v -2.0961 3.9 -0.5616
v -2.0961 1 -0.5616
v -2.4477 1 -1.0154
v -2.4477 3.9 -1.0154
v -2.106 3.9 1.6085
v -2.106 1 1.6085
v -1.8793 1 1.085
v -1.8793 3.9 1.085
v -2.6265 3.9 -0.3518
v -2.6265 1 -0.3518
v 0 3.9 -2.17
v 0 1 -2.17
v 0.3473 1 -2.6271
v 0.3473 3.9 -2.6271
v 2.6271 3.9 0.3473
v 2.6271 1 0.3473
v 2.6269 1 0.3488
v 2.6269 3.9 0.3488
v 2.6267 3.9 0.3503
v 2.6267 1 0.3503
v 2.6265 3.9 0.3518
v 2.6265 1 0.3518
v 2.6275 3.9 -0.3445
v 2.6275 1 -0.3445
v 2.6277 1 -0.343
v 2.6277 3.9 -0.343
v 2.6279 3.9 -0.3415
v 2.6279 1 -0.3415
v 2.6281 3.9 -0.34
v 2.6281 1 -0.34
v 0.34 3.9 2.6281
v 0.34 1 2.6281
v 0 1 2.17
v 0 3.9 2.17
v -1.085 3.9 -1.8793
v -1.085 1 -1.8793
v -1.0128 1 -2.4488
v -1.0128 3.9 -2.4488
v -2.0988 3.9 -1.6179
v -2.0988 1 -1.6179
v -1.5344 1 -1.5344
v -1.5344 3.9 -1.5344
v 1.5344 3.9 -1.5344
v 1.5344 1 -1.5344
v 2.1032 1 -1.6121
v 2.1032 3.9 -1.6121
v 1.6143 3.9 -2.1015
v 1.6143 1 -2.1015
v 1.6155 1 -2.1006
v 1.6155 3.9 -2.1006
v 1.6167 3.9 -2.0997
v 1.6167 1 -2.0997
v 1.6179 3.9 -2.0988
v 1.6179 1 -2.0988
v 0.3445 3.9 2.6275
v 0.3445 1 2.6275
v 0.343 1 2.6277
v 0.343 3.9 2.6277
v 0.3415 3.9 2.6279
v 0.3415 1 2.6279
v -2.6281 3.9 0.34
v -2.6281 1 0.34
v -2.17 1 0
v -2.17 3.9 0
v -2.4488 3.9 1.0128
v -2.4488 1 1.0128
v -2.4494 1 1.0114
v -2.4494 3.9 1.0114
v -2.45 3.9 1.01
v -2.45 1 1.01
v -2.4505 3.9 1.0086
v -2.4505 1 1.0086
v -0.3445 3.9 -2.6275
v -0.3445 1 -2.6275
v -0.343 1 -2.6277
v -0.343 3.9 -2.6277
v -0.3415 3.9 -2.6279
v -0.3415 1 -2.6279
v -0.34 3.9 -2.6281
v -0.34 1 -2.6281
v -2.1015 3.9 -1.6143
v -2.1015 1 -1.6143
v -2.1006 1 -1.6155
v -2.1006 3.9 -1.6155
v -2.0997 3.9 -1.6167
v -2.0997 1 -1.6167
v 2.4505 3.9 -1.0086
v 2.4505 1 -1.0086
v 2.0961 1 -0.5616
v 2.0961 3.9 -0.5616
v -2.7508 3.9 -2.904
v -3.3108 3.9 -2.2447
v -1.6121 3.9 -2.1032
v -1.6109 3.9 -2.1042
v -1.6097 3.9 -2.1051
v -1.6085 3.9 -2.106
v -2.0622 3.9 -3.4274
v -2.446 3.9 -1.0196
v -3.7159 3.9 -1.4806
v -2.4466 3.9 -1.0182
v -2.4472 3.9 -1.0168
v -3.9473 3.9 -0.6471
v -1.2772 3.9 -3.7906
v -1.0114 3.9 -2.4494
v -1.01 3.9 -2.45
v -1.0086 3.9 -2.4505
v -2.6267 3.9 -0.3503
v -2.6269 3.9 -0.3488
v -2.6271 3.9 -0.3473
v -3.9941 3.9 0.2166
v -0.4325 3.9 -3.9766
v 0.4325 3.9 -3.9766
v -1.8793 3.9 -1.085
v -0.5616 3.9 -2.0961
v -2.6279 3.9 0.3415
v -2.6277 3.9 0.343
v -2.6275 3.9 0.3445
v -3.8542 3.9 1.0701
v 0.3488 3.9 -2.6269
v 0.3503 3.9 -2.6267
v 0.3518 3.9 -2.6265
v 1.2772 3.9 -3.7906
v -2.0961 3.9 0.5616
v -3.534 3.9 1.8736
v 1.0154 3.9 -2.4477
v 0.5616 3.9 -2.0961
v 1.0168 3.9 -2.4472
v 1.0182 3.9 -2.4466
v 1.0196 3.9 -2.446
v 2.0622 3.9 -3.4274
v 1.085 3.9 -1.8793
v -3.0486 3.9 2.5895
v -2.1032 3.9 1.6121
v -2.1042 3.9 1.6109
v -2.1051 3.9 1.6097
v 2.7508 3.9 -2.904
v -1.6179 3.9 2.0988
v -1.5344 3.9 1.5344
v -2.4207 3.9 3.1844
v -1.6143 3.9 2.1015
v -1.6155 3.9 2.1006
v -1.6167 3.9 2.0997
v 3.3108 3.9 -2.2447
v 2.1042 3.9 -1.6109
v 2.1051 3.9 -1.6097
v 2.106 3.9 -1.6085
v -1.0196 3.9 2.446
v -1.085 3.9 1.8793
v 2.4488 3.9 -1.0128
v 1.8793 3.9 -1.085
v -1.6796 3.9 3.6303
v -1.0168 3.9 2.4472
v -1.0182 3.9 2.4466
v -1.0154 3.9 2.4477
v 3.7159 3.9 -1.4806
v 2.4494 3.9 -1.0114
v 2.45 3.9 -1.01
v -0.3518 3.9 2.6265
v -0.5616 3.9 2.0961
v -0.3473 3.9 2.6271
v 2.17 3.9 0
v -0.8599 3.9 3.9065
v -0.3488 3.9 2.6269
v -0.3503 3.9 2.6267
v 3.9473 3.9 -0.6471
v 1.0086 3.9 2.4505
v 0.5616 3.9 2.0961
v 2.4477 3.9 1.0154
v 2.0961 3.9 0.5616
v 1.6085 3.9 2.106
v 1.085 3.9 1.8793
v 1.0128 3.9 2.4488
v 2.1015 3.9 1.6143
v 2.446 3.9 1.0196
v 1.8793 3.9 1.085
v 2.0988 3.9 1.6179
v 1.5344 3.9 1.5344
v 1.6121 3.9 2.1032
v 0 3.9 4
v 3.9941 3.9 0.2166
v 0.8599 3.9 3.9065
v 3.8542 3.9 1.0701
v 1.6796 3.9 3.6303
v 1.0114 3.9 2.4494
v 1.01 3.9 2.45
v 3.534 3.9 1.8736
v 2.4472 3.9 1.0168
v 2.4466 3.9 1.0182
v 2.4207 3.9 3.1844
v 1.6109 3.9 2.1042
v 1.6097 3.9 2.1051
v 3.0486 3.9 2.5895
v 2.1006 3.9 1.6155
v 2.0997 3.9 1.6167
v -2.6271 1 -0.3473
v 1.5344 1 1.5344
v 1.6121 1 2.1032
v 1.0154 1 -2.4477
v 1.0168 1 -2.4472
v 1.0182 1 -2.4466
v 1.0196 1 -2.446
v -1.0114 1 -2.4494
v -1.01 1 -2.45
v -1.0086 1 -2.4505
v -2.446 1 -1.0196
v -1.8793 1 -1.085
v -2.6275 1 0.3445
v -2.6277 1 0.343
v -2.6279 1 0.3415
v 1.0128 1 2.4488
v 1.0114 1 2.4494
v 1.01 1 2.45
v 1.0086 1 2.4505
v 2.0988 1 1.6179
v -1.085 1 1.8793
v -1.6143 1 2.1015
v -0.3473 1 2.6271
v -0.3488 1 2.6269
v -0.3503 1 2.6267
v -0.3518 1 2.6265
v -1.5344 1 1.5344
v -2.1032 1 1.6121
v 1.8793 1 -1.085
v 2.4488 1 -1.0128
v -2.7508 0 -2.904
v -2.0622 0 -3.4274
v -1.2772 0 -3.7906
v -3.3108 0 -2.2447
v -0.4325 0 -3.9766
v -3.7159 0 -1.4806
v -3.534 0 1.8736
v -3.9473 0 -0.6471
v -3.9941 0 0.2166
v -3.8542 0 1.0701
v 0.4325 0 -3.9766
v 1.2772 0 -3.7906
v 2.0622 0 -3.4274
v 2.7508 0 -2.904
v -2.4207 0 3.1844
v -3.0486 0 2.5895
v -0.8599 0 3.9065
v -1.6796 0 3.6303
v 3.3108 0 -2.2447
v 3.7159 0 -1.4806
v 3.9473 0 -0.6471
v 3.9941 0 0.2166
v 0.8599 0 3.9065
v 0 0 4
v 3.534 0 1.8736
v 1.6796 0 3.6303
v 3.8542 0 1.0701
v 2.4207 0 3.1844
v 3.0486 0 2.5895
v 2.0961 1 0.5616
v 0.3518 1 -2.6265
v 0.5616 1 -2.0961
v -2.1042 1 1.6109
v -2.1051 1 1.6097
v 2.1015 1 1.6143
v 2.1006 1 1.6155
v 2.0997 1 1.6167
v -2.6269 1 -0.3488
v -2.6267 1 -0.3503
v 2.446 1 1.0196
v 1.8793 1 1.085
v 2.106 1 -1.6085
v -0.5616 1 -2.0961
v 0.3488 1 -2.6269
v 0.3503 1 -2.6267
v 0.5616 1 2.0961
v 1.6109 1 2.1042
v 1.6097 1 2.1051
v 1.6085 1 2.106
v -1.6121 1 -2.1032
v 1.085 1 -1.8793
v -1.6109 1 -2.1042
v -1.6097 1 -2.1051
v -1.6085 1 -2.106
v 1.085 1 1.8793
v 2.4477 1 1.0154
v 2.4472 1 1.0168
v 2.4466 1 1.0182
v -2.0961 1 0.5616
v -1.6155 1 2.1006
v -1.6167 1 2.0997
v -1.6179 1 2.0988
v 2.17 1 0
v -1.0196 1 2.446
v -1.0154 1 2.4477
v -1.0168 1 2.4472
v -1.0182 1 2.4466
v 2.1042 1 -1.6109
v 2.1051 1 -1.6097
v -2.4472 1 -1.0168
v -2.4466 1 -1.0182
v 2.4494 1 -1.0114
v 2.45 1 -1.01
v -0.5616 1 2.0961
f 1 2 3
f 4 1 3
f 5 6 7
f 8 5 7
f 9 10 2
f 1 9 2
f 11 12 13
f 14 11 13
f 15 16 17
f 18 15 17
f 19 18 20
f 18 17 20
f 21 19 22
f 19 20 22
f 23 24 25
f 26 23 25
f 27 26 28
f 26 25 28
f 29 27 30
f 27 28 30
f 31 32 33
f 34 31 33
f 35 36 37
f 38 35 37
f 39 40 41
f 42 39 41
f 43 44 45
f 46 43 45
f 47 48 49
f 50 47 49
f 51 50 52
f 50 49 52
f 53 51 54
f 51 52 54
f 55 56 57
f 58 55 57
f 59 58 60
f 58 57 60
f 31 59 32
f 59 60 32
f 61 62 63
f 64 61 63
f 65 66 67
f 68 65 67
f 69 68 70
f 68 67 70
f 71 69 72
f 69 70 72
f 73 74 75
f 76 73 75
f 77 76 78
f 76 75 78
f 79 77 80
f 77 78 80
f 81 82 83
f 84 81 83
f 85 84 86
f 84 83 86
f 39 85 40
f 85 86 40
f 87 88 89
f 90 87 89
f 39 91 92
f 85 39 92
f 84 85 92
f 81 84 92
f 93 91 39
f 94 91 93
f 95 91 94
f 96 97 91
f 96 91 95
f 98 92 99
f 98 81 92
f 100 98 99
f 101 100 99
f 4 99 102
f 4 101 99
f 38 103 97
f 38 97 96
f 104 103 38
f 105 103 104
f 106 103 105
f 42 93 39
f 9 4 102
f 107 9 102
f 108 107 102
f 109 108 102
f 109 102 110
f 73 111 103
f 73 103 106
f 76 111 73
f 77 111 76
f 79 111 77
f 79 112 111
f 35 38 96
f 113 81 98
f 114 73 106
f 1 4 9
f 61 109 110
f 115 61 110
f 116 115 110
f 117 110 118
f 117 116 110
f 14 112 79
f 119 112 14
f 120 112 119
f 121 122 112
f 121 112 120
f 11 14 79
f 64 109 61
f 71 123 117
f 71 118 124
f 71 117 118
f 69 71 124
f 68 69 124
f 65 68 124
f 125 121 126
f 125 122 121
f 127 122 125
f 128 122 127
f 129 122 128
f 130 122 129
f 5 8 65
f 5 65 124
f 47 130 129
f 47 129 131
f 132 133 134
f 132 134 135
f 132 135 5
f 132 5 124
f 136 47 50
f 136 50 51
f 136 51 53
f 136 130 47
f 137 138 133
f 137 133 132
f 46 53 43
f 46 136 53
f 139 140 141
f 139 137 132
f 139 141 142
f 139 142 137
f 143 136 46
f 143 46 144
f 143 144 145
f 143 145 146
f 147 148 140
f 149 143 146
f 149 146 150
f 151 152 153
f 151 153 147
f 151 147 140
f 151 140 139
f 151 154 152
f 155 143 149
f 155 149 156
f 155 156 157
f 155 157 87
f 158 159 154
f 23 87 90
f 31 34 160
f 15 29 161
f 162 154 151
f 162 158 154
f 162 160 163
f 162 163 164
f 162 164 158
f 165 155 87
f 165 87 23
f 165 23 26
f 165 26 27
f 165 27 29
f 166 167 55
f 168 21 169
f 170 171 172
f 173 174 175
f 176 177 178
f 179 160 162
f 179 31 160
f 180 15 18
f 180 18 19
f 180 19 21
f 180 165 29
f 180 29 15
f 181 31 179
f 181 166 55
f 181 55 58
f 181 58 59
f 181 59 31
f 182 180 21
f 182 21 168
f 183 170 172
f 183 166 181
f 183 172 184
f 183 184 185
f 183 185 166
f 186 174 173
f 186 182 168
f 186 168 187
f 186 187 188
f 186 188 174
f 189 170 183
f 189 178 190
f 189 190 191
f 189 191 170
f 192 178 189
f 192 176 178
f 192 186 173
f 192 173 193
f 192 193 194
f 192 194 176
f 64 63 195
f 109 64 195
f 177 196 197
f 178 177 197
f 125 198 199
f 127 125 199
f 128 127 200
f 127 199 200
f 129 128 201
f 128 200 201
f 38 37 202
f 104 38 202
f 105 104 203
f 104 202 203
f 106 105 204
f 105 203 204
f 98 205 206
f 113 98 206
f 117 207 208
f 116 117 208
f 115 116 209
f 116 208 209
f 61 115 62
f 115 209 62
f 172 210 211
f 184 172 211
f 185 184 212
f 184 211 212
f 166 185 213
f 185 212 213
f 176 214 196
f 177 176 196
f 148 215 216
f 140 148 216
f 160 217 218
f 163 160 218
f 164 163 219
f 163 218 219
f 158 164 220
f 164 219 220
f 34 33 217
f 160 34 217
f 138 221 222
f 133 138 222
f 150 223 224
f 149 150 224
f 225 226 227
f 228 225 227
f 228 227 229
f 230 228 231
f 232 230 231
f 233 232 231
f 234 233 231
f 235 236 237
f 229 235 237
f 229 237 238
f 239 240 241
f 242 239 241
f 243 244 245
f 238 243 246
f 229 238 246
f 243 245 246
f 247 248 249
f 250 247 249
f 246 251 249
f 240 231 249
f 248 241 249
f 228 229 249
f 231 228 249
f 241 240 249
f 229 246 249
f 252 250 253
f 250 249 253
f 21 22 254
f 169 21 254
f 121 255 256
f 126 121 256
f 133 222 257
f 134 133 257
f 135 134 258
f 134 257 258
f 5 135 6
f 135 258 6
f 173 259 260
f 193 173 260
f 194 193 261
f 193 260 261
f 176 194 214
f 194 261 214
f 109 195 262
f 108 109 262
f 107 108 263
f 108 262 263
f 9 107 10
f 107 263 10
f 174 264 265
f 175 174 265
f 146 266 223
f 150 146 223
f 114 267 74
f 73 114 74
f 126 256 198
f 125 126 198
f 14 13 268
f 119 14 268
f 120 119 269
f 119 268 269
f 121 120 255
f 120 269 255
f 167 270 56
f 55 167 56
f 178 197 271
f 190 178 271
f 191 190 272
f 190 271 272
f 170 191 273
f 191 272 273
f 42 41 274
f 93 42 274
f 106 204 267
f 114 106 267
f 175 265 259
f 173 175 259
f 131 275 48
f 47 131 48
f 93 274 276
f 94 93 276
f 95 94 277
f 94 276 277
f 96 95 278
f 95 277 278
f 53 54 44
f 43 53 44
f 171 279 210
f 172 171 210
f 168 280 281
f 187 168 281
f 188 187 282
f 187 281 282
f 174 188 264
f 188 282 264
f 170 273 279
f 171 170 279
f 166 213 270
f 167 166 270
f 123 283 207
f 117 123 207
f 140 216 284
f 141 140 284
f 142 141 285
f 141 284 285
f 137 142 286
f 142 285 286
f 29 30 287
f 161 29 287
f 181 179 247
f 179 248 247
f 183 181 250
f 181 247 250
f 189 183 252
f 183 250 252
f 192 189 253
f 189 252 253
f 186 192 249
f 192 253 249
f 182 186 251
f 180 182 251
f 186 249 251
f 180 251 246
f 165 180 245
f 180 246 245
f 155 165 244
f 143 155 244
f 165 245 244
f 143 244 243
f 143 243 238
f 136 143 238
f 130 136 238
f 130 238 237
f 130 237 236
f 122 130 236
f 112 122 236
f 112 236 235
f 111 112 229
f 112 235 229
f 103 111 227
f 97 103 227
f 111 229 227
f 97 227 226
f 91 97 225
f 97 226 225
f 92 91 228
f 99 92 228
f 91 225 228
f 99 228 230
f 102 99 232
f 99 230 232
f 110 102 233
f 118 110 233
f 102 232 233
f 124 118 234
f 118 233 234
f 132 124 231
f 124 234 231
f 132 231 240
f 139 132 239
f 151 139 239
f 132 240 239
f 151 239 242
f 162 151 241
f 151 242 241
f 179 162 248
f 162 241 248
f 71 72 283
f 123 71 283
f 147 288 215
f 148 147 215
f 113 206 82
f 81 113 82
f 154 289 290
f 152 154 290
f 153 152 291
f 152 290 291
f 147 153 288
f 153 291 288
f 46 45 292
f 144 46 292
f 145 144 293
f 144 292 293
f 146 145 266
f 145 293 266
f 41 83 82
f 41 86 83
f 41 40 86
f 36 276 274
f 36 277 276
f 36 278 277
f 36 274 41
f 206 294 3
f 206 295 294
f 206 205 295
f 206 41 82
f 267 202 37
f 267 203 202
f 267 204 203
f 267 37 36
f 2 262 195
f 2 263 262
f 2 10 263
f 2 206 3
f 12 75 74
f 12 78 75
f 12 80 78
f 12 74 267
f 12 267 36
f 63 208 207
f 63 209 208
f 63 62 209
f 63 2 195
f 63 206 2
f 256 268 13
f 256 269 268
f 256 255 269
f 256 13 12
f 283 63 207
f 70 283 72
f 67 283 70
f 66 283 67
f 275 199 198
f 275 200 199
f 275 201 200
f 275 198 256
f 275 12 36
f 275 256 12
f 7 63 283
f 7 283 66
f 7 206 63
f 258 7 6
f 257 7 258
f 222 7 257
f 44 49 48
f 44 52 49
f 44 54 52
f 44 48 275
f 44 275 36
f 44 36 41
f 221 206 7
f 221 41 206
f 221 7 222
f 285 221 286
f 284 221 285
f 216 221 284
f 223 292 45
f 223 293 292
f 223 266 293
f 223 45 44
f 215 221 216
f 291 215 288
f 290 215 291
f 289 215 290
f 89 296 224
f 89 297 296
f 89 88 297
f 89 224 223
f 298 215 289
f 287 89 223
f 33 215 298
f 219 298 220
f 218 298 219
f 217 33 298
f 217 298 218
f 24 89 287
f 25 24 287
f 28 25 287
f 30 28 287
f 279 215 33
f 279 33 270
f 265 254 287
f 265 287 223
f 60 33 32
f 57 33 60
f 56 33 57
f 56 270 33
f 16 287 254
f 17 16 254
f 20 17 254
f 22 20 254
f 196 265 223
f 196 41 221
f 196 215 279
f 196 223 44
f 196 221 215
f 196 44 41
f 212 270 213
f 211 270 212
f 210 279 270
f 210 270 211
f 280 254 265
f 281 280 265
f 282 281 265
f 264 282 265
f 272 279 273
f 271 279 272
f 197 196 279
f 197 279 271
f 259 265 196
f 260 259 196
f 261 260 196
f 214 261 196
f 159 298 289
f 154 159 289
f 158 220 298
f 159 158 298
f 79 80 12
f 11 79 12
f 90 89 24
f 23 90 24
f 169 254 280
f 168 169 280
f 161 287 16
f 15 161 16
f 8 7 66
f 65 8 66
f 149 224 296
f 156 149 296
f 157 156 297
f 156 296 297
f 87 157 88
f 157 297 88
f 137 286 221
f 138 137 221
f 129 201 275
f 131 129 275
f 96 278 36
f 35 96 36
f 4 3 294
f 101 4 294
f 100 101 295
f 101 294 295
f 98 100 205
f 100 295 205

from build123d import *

# Parameters (mm, degrees)
SKETCH1_R           = 4
BOSS_EXTRUDE7_DEPTH = 1
BOSS_EXTRUDE8_START = 1
SKETCH1_4_R         = 4
BOSS_EXTRUDE8_DEPTH = 2.9


with BuildPart() as part:
    # Sketch1 → Boss-Extrude7 (new body)
    with BuildSketch(Plane(origin=(0, 0, 0), x_dir=(1, 0, 0), z_dir=(0, 1, 0))):
        with Locations(Location((0, 0, 0), (0, 0, 270))):
            Circle(SKETCH1_R)
    extrude(amount=BOSS_EXTRUDE7_DEPTH)

    # Sketch1<4> → Boss-Extrude8 (add)
    with BuildSketch(Plane(origin=(0, 0, 0), x_dir=(1, 0, 0), z_dir=(0, 1, 0)).offset(BOSS_EXTRUDE8_START)):
        with Locations(Location((0, 0, 0), (0, 0, 270))):
            Circle(SKETCH1_4_R)
        with BuildLine():
            Line((-0.34, 2.628098172), (0, 2.17))
            Line((0, 2.17), (0.3473, 2.627143451))
            ThreePointArc((0.3473, 2.627143451), (0.349543667, 2.62684587), (0.351787078, 2.626546373))
            Line((0.351787078, 2.626546373), (0.561637328, 2.096059043))
            Line((0.561637328, 2.096059043), (1.015420799, 2.447737854))
            ThreePointArc((1.015420799, 2.447737854), (1.017510995, 2.44686971), (1.019600449, 2.44599978))
            Line((1.019600449, 2.44599978), (1.085, 1.879275126))
            Line((1.085, 1.879275126), (1.614342348, 2.101522968))
            ThreePointArc((1.614342348, 2.101522968), (1.61613663, 2.100143422), (1.617929733, 2.098762344))
            Line((1.617929733, 2.098762344), (1.534421715, 1.534421715))
            Line((1.534421715, 1.534421715), (2.103249134, 1.612092764))
            ThreePointArc((2.103249134, 1.612092764), (2.104625225, 1.610295831), (2.10599978, 1.608497723))
            Line((2.10599978, 1.608497723), (1.879275126, 1.085))
            Line((1.879275126, 1.085), (2.448822968, 1.012801103))
            ThreePointArc((2.448822968, 1.012801103), (2.449687089, 1.01070924), (2.450549423, 1.00861664))
            Line((2.450549423, 1.00861664), (2.096059043, 0.561637328))
            Line((2.096059043, 0.561637328), (2.627513563, 0.34448872))
            ThreePointArc((2.627513563, 0.34448872), (2.627806826, 0.342244485), (2.628098172, 0.34))
            Line((2.628098172, 0.34), (2.17, 0))
            Line((2.17, 0), (2.627143451, -0.3473))
            ThreePointArc((2.627143451, -0.3473), (2.62684587, -0.349543667), (2.626546373, -0.351787078))
            Line((2.626546373, -0.351787078), (2.096059043, -0.561637328))
            Line((2.096059043, -0.561637328), (2.447737854, -1.015420799))
            ThreePointArc((2.447737854, -1.015420799), (2.44686971, -1.017510995), (2.44599978, -1.019600449))
            Line((2.44599978, -1.019600449), (1.879275126, -1.085))
            Line((1.879275126, -1.085), (2.101522968, -1.614342348))
            ThreePointArc((2.101522968, -1.614342348), (2.100143422, -1.61613663), (2.098762344, -1.617929733))
            Line((2.098762344, -1.617929733), (1.534421715, -1.534421715))
            Line((1.534421715, -1.534421715), (1.612092764, -2.103249134))
            ThreePointArc((1.612092764, -2.103249134), (1.610295831, -2.104625225), (1.608497723, -2.10599978))
            Line((1.608497723, -2.10599978), (1.085, -1.879275126))
            Line((1.085, -1.879275126), (1.012801103, -2.448822968))
            ThreePointArc((1.012801103, -2.448822968), (1.01070924, -2.449687089), (1.00861664, -2.450549423))
            Line((1.00861664, -2.450549423), (0.561637328, -2.096059043))
            Line((0.561637328, -2.096059043), (0.34448872, -2.627513563))
            ThreePointArc((0.34448872, -2.627513563), (0.342244485, -2.627806826), (0.34, -2.628098172))
            Line((0.34, -2.628098172), (0, -2.17))
            Line((0, -2.17), (-0.3473, -2.627143451))
            ThreePointArc((-0.3473, -2.627143451), (-0.349543667, -2.62684587), (-0.351787078, -2.626546373))
            Line((-0.351787078, -2.626546373), (-0.561637328, -2.096059043))
            Line((-0.561637328, -2.096059043), (-1.015420799, -2.447737854))
            ThreePointArc((-1.015420799, -2.447737854), (-1.017510995, -2.44686971), (-1.019600449, -2.44599978))
            Line((-1.019600449, -2.44599978), (-1.085, -1.879275126))
            Line((-1.085, -1.879275126), (-1.614342348, -2.101522968))
            ThreePointArc((-1.614342348, -2.101522968), (-1.61613663, -2.100143422), (-1.617929733, -2.098762344))
            Line((-1.617929733, -2.098762344), (-1.534421715, -1.534421715))
            Line((-1.534421715, -1.534421715), (-2.103249134, -1.612092764))
            ThreePointArc((-2.103249134, -1.612092764), (-2.104625225, -1.610295831), (-2.10599978, -1.608497723))
            Line((-2.10599978, -1.608497723), (-1.879275126, -1.085))
            Line((-1.879275126, -1.085), (-2.448822968, -1.012801103))
            ThreePointArc((-2.448822968, -1.012801103), (-2.449687089, -1.01070924), (-2.450549423, -1.00861664))
            Line((-2.450549423, -1.00861664), (-2.096059043, -0.561637328))
            Line((-2.096059043, -0.561637328), (-2.627513563, -0.34448872))
            ThreePointArc((-2.627513563, -0.34448872), (-2.627806826, -0.342244485), (-2.628098172, -0.34))
            Line((-2.628098172, -0.34), (-2.17, 0))
            Line((-2.17, 0), (-2.627143451, 0.3473))
            ThreePointArc((-2.627143451, 0.3473), (-2.62684587, 0.349543667), (-2.626546373, 0.351787078))
            Line((-2.626546373, 0.351787078), (-2.096059043, 0.561637328))
            Line((-2.096059043, 0.561637328), (-2.447737854, 1.015420799))
            ThreePointArc((-2.447737854, 1.015420799), (-2.44686971, 1.017510995), (-2.44599978, 1.019600449))
            Line((-2.44599978, 1.019600449), (-1.879275126, 1.085))
            Line((-1.879275126, 1.085), (-2.101522968, 1.614342348))
            ThreePointArc((-2.101522968, 1.614342348), (-2.100143422, 1.61613663), (-2.098762344, 1.617929733))
            Line((-2.098762344, 1.617929733), (-1.534421715, 1.534421715))
            Line((-1.534421715, 1.534421715), (-1.612092764, 2.103249134))
            ThreePointArc((-1.612092764, 2.103249134), (-1.610295831, 2.104625225), (-1.608497723, 2.10599978))
            Line((-1.608497723, 2.10599978), (-1.085, 1.879275126))
            Line((-1.085, 1.879275126), (-1.012801103, 2.448822968))
            ThreePointArc((-1.012801103, 2.448822968), (-1.01070924, 2.449687089), (-1.00861664, 2.450549423))
            Line((-1.00861664, 2.450549423), (-0.561637328, 2.096059043))
            Line((-0.561637328, 2.096059043), (-0.34448872, 2.627513563))
            ThreePointArc((-0.34448872, 2.627513563), (-0.342244485, 2.627806826), (-0.34, 2.628098172))
        make_face(mode=Mode.SUBTRACT)
    extrude(amount=BOSS_EXTRUDE8_DEPTH)


solid = part.part
